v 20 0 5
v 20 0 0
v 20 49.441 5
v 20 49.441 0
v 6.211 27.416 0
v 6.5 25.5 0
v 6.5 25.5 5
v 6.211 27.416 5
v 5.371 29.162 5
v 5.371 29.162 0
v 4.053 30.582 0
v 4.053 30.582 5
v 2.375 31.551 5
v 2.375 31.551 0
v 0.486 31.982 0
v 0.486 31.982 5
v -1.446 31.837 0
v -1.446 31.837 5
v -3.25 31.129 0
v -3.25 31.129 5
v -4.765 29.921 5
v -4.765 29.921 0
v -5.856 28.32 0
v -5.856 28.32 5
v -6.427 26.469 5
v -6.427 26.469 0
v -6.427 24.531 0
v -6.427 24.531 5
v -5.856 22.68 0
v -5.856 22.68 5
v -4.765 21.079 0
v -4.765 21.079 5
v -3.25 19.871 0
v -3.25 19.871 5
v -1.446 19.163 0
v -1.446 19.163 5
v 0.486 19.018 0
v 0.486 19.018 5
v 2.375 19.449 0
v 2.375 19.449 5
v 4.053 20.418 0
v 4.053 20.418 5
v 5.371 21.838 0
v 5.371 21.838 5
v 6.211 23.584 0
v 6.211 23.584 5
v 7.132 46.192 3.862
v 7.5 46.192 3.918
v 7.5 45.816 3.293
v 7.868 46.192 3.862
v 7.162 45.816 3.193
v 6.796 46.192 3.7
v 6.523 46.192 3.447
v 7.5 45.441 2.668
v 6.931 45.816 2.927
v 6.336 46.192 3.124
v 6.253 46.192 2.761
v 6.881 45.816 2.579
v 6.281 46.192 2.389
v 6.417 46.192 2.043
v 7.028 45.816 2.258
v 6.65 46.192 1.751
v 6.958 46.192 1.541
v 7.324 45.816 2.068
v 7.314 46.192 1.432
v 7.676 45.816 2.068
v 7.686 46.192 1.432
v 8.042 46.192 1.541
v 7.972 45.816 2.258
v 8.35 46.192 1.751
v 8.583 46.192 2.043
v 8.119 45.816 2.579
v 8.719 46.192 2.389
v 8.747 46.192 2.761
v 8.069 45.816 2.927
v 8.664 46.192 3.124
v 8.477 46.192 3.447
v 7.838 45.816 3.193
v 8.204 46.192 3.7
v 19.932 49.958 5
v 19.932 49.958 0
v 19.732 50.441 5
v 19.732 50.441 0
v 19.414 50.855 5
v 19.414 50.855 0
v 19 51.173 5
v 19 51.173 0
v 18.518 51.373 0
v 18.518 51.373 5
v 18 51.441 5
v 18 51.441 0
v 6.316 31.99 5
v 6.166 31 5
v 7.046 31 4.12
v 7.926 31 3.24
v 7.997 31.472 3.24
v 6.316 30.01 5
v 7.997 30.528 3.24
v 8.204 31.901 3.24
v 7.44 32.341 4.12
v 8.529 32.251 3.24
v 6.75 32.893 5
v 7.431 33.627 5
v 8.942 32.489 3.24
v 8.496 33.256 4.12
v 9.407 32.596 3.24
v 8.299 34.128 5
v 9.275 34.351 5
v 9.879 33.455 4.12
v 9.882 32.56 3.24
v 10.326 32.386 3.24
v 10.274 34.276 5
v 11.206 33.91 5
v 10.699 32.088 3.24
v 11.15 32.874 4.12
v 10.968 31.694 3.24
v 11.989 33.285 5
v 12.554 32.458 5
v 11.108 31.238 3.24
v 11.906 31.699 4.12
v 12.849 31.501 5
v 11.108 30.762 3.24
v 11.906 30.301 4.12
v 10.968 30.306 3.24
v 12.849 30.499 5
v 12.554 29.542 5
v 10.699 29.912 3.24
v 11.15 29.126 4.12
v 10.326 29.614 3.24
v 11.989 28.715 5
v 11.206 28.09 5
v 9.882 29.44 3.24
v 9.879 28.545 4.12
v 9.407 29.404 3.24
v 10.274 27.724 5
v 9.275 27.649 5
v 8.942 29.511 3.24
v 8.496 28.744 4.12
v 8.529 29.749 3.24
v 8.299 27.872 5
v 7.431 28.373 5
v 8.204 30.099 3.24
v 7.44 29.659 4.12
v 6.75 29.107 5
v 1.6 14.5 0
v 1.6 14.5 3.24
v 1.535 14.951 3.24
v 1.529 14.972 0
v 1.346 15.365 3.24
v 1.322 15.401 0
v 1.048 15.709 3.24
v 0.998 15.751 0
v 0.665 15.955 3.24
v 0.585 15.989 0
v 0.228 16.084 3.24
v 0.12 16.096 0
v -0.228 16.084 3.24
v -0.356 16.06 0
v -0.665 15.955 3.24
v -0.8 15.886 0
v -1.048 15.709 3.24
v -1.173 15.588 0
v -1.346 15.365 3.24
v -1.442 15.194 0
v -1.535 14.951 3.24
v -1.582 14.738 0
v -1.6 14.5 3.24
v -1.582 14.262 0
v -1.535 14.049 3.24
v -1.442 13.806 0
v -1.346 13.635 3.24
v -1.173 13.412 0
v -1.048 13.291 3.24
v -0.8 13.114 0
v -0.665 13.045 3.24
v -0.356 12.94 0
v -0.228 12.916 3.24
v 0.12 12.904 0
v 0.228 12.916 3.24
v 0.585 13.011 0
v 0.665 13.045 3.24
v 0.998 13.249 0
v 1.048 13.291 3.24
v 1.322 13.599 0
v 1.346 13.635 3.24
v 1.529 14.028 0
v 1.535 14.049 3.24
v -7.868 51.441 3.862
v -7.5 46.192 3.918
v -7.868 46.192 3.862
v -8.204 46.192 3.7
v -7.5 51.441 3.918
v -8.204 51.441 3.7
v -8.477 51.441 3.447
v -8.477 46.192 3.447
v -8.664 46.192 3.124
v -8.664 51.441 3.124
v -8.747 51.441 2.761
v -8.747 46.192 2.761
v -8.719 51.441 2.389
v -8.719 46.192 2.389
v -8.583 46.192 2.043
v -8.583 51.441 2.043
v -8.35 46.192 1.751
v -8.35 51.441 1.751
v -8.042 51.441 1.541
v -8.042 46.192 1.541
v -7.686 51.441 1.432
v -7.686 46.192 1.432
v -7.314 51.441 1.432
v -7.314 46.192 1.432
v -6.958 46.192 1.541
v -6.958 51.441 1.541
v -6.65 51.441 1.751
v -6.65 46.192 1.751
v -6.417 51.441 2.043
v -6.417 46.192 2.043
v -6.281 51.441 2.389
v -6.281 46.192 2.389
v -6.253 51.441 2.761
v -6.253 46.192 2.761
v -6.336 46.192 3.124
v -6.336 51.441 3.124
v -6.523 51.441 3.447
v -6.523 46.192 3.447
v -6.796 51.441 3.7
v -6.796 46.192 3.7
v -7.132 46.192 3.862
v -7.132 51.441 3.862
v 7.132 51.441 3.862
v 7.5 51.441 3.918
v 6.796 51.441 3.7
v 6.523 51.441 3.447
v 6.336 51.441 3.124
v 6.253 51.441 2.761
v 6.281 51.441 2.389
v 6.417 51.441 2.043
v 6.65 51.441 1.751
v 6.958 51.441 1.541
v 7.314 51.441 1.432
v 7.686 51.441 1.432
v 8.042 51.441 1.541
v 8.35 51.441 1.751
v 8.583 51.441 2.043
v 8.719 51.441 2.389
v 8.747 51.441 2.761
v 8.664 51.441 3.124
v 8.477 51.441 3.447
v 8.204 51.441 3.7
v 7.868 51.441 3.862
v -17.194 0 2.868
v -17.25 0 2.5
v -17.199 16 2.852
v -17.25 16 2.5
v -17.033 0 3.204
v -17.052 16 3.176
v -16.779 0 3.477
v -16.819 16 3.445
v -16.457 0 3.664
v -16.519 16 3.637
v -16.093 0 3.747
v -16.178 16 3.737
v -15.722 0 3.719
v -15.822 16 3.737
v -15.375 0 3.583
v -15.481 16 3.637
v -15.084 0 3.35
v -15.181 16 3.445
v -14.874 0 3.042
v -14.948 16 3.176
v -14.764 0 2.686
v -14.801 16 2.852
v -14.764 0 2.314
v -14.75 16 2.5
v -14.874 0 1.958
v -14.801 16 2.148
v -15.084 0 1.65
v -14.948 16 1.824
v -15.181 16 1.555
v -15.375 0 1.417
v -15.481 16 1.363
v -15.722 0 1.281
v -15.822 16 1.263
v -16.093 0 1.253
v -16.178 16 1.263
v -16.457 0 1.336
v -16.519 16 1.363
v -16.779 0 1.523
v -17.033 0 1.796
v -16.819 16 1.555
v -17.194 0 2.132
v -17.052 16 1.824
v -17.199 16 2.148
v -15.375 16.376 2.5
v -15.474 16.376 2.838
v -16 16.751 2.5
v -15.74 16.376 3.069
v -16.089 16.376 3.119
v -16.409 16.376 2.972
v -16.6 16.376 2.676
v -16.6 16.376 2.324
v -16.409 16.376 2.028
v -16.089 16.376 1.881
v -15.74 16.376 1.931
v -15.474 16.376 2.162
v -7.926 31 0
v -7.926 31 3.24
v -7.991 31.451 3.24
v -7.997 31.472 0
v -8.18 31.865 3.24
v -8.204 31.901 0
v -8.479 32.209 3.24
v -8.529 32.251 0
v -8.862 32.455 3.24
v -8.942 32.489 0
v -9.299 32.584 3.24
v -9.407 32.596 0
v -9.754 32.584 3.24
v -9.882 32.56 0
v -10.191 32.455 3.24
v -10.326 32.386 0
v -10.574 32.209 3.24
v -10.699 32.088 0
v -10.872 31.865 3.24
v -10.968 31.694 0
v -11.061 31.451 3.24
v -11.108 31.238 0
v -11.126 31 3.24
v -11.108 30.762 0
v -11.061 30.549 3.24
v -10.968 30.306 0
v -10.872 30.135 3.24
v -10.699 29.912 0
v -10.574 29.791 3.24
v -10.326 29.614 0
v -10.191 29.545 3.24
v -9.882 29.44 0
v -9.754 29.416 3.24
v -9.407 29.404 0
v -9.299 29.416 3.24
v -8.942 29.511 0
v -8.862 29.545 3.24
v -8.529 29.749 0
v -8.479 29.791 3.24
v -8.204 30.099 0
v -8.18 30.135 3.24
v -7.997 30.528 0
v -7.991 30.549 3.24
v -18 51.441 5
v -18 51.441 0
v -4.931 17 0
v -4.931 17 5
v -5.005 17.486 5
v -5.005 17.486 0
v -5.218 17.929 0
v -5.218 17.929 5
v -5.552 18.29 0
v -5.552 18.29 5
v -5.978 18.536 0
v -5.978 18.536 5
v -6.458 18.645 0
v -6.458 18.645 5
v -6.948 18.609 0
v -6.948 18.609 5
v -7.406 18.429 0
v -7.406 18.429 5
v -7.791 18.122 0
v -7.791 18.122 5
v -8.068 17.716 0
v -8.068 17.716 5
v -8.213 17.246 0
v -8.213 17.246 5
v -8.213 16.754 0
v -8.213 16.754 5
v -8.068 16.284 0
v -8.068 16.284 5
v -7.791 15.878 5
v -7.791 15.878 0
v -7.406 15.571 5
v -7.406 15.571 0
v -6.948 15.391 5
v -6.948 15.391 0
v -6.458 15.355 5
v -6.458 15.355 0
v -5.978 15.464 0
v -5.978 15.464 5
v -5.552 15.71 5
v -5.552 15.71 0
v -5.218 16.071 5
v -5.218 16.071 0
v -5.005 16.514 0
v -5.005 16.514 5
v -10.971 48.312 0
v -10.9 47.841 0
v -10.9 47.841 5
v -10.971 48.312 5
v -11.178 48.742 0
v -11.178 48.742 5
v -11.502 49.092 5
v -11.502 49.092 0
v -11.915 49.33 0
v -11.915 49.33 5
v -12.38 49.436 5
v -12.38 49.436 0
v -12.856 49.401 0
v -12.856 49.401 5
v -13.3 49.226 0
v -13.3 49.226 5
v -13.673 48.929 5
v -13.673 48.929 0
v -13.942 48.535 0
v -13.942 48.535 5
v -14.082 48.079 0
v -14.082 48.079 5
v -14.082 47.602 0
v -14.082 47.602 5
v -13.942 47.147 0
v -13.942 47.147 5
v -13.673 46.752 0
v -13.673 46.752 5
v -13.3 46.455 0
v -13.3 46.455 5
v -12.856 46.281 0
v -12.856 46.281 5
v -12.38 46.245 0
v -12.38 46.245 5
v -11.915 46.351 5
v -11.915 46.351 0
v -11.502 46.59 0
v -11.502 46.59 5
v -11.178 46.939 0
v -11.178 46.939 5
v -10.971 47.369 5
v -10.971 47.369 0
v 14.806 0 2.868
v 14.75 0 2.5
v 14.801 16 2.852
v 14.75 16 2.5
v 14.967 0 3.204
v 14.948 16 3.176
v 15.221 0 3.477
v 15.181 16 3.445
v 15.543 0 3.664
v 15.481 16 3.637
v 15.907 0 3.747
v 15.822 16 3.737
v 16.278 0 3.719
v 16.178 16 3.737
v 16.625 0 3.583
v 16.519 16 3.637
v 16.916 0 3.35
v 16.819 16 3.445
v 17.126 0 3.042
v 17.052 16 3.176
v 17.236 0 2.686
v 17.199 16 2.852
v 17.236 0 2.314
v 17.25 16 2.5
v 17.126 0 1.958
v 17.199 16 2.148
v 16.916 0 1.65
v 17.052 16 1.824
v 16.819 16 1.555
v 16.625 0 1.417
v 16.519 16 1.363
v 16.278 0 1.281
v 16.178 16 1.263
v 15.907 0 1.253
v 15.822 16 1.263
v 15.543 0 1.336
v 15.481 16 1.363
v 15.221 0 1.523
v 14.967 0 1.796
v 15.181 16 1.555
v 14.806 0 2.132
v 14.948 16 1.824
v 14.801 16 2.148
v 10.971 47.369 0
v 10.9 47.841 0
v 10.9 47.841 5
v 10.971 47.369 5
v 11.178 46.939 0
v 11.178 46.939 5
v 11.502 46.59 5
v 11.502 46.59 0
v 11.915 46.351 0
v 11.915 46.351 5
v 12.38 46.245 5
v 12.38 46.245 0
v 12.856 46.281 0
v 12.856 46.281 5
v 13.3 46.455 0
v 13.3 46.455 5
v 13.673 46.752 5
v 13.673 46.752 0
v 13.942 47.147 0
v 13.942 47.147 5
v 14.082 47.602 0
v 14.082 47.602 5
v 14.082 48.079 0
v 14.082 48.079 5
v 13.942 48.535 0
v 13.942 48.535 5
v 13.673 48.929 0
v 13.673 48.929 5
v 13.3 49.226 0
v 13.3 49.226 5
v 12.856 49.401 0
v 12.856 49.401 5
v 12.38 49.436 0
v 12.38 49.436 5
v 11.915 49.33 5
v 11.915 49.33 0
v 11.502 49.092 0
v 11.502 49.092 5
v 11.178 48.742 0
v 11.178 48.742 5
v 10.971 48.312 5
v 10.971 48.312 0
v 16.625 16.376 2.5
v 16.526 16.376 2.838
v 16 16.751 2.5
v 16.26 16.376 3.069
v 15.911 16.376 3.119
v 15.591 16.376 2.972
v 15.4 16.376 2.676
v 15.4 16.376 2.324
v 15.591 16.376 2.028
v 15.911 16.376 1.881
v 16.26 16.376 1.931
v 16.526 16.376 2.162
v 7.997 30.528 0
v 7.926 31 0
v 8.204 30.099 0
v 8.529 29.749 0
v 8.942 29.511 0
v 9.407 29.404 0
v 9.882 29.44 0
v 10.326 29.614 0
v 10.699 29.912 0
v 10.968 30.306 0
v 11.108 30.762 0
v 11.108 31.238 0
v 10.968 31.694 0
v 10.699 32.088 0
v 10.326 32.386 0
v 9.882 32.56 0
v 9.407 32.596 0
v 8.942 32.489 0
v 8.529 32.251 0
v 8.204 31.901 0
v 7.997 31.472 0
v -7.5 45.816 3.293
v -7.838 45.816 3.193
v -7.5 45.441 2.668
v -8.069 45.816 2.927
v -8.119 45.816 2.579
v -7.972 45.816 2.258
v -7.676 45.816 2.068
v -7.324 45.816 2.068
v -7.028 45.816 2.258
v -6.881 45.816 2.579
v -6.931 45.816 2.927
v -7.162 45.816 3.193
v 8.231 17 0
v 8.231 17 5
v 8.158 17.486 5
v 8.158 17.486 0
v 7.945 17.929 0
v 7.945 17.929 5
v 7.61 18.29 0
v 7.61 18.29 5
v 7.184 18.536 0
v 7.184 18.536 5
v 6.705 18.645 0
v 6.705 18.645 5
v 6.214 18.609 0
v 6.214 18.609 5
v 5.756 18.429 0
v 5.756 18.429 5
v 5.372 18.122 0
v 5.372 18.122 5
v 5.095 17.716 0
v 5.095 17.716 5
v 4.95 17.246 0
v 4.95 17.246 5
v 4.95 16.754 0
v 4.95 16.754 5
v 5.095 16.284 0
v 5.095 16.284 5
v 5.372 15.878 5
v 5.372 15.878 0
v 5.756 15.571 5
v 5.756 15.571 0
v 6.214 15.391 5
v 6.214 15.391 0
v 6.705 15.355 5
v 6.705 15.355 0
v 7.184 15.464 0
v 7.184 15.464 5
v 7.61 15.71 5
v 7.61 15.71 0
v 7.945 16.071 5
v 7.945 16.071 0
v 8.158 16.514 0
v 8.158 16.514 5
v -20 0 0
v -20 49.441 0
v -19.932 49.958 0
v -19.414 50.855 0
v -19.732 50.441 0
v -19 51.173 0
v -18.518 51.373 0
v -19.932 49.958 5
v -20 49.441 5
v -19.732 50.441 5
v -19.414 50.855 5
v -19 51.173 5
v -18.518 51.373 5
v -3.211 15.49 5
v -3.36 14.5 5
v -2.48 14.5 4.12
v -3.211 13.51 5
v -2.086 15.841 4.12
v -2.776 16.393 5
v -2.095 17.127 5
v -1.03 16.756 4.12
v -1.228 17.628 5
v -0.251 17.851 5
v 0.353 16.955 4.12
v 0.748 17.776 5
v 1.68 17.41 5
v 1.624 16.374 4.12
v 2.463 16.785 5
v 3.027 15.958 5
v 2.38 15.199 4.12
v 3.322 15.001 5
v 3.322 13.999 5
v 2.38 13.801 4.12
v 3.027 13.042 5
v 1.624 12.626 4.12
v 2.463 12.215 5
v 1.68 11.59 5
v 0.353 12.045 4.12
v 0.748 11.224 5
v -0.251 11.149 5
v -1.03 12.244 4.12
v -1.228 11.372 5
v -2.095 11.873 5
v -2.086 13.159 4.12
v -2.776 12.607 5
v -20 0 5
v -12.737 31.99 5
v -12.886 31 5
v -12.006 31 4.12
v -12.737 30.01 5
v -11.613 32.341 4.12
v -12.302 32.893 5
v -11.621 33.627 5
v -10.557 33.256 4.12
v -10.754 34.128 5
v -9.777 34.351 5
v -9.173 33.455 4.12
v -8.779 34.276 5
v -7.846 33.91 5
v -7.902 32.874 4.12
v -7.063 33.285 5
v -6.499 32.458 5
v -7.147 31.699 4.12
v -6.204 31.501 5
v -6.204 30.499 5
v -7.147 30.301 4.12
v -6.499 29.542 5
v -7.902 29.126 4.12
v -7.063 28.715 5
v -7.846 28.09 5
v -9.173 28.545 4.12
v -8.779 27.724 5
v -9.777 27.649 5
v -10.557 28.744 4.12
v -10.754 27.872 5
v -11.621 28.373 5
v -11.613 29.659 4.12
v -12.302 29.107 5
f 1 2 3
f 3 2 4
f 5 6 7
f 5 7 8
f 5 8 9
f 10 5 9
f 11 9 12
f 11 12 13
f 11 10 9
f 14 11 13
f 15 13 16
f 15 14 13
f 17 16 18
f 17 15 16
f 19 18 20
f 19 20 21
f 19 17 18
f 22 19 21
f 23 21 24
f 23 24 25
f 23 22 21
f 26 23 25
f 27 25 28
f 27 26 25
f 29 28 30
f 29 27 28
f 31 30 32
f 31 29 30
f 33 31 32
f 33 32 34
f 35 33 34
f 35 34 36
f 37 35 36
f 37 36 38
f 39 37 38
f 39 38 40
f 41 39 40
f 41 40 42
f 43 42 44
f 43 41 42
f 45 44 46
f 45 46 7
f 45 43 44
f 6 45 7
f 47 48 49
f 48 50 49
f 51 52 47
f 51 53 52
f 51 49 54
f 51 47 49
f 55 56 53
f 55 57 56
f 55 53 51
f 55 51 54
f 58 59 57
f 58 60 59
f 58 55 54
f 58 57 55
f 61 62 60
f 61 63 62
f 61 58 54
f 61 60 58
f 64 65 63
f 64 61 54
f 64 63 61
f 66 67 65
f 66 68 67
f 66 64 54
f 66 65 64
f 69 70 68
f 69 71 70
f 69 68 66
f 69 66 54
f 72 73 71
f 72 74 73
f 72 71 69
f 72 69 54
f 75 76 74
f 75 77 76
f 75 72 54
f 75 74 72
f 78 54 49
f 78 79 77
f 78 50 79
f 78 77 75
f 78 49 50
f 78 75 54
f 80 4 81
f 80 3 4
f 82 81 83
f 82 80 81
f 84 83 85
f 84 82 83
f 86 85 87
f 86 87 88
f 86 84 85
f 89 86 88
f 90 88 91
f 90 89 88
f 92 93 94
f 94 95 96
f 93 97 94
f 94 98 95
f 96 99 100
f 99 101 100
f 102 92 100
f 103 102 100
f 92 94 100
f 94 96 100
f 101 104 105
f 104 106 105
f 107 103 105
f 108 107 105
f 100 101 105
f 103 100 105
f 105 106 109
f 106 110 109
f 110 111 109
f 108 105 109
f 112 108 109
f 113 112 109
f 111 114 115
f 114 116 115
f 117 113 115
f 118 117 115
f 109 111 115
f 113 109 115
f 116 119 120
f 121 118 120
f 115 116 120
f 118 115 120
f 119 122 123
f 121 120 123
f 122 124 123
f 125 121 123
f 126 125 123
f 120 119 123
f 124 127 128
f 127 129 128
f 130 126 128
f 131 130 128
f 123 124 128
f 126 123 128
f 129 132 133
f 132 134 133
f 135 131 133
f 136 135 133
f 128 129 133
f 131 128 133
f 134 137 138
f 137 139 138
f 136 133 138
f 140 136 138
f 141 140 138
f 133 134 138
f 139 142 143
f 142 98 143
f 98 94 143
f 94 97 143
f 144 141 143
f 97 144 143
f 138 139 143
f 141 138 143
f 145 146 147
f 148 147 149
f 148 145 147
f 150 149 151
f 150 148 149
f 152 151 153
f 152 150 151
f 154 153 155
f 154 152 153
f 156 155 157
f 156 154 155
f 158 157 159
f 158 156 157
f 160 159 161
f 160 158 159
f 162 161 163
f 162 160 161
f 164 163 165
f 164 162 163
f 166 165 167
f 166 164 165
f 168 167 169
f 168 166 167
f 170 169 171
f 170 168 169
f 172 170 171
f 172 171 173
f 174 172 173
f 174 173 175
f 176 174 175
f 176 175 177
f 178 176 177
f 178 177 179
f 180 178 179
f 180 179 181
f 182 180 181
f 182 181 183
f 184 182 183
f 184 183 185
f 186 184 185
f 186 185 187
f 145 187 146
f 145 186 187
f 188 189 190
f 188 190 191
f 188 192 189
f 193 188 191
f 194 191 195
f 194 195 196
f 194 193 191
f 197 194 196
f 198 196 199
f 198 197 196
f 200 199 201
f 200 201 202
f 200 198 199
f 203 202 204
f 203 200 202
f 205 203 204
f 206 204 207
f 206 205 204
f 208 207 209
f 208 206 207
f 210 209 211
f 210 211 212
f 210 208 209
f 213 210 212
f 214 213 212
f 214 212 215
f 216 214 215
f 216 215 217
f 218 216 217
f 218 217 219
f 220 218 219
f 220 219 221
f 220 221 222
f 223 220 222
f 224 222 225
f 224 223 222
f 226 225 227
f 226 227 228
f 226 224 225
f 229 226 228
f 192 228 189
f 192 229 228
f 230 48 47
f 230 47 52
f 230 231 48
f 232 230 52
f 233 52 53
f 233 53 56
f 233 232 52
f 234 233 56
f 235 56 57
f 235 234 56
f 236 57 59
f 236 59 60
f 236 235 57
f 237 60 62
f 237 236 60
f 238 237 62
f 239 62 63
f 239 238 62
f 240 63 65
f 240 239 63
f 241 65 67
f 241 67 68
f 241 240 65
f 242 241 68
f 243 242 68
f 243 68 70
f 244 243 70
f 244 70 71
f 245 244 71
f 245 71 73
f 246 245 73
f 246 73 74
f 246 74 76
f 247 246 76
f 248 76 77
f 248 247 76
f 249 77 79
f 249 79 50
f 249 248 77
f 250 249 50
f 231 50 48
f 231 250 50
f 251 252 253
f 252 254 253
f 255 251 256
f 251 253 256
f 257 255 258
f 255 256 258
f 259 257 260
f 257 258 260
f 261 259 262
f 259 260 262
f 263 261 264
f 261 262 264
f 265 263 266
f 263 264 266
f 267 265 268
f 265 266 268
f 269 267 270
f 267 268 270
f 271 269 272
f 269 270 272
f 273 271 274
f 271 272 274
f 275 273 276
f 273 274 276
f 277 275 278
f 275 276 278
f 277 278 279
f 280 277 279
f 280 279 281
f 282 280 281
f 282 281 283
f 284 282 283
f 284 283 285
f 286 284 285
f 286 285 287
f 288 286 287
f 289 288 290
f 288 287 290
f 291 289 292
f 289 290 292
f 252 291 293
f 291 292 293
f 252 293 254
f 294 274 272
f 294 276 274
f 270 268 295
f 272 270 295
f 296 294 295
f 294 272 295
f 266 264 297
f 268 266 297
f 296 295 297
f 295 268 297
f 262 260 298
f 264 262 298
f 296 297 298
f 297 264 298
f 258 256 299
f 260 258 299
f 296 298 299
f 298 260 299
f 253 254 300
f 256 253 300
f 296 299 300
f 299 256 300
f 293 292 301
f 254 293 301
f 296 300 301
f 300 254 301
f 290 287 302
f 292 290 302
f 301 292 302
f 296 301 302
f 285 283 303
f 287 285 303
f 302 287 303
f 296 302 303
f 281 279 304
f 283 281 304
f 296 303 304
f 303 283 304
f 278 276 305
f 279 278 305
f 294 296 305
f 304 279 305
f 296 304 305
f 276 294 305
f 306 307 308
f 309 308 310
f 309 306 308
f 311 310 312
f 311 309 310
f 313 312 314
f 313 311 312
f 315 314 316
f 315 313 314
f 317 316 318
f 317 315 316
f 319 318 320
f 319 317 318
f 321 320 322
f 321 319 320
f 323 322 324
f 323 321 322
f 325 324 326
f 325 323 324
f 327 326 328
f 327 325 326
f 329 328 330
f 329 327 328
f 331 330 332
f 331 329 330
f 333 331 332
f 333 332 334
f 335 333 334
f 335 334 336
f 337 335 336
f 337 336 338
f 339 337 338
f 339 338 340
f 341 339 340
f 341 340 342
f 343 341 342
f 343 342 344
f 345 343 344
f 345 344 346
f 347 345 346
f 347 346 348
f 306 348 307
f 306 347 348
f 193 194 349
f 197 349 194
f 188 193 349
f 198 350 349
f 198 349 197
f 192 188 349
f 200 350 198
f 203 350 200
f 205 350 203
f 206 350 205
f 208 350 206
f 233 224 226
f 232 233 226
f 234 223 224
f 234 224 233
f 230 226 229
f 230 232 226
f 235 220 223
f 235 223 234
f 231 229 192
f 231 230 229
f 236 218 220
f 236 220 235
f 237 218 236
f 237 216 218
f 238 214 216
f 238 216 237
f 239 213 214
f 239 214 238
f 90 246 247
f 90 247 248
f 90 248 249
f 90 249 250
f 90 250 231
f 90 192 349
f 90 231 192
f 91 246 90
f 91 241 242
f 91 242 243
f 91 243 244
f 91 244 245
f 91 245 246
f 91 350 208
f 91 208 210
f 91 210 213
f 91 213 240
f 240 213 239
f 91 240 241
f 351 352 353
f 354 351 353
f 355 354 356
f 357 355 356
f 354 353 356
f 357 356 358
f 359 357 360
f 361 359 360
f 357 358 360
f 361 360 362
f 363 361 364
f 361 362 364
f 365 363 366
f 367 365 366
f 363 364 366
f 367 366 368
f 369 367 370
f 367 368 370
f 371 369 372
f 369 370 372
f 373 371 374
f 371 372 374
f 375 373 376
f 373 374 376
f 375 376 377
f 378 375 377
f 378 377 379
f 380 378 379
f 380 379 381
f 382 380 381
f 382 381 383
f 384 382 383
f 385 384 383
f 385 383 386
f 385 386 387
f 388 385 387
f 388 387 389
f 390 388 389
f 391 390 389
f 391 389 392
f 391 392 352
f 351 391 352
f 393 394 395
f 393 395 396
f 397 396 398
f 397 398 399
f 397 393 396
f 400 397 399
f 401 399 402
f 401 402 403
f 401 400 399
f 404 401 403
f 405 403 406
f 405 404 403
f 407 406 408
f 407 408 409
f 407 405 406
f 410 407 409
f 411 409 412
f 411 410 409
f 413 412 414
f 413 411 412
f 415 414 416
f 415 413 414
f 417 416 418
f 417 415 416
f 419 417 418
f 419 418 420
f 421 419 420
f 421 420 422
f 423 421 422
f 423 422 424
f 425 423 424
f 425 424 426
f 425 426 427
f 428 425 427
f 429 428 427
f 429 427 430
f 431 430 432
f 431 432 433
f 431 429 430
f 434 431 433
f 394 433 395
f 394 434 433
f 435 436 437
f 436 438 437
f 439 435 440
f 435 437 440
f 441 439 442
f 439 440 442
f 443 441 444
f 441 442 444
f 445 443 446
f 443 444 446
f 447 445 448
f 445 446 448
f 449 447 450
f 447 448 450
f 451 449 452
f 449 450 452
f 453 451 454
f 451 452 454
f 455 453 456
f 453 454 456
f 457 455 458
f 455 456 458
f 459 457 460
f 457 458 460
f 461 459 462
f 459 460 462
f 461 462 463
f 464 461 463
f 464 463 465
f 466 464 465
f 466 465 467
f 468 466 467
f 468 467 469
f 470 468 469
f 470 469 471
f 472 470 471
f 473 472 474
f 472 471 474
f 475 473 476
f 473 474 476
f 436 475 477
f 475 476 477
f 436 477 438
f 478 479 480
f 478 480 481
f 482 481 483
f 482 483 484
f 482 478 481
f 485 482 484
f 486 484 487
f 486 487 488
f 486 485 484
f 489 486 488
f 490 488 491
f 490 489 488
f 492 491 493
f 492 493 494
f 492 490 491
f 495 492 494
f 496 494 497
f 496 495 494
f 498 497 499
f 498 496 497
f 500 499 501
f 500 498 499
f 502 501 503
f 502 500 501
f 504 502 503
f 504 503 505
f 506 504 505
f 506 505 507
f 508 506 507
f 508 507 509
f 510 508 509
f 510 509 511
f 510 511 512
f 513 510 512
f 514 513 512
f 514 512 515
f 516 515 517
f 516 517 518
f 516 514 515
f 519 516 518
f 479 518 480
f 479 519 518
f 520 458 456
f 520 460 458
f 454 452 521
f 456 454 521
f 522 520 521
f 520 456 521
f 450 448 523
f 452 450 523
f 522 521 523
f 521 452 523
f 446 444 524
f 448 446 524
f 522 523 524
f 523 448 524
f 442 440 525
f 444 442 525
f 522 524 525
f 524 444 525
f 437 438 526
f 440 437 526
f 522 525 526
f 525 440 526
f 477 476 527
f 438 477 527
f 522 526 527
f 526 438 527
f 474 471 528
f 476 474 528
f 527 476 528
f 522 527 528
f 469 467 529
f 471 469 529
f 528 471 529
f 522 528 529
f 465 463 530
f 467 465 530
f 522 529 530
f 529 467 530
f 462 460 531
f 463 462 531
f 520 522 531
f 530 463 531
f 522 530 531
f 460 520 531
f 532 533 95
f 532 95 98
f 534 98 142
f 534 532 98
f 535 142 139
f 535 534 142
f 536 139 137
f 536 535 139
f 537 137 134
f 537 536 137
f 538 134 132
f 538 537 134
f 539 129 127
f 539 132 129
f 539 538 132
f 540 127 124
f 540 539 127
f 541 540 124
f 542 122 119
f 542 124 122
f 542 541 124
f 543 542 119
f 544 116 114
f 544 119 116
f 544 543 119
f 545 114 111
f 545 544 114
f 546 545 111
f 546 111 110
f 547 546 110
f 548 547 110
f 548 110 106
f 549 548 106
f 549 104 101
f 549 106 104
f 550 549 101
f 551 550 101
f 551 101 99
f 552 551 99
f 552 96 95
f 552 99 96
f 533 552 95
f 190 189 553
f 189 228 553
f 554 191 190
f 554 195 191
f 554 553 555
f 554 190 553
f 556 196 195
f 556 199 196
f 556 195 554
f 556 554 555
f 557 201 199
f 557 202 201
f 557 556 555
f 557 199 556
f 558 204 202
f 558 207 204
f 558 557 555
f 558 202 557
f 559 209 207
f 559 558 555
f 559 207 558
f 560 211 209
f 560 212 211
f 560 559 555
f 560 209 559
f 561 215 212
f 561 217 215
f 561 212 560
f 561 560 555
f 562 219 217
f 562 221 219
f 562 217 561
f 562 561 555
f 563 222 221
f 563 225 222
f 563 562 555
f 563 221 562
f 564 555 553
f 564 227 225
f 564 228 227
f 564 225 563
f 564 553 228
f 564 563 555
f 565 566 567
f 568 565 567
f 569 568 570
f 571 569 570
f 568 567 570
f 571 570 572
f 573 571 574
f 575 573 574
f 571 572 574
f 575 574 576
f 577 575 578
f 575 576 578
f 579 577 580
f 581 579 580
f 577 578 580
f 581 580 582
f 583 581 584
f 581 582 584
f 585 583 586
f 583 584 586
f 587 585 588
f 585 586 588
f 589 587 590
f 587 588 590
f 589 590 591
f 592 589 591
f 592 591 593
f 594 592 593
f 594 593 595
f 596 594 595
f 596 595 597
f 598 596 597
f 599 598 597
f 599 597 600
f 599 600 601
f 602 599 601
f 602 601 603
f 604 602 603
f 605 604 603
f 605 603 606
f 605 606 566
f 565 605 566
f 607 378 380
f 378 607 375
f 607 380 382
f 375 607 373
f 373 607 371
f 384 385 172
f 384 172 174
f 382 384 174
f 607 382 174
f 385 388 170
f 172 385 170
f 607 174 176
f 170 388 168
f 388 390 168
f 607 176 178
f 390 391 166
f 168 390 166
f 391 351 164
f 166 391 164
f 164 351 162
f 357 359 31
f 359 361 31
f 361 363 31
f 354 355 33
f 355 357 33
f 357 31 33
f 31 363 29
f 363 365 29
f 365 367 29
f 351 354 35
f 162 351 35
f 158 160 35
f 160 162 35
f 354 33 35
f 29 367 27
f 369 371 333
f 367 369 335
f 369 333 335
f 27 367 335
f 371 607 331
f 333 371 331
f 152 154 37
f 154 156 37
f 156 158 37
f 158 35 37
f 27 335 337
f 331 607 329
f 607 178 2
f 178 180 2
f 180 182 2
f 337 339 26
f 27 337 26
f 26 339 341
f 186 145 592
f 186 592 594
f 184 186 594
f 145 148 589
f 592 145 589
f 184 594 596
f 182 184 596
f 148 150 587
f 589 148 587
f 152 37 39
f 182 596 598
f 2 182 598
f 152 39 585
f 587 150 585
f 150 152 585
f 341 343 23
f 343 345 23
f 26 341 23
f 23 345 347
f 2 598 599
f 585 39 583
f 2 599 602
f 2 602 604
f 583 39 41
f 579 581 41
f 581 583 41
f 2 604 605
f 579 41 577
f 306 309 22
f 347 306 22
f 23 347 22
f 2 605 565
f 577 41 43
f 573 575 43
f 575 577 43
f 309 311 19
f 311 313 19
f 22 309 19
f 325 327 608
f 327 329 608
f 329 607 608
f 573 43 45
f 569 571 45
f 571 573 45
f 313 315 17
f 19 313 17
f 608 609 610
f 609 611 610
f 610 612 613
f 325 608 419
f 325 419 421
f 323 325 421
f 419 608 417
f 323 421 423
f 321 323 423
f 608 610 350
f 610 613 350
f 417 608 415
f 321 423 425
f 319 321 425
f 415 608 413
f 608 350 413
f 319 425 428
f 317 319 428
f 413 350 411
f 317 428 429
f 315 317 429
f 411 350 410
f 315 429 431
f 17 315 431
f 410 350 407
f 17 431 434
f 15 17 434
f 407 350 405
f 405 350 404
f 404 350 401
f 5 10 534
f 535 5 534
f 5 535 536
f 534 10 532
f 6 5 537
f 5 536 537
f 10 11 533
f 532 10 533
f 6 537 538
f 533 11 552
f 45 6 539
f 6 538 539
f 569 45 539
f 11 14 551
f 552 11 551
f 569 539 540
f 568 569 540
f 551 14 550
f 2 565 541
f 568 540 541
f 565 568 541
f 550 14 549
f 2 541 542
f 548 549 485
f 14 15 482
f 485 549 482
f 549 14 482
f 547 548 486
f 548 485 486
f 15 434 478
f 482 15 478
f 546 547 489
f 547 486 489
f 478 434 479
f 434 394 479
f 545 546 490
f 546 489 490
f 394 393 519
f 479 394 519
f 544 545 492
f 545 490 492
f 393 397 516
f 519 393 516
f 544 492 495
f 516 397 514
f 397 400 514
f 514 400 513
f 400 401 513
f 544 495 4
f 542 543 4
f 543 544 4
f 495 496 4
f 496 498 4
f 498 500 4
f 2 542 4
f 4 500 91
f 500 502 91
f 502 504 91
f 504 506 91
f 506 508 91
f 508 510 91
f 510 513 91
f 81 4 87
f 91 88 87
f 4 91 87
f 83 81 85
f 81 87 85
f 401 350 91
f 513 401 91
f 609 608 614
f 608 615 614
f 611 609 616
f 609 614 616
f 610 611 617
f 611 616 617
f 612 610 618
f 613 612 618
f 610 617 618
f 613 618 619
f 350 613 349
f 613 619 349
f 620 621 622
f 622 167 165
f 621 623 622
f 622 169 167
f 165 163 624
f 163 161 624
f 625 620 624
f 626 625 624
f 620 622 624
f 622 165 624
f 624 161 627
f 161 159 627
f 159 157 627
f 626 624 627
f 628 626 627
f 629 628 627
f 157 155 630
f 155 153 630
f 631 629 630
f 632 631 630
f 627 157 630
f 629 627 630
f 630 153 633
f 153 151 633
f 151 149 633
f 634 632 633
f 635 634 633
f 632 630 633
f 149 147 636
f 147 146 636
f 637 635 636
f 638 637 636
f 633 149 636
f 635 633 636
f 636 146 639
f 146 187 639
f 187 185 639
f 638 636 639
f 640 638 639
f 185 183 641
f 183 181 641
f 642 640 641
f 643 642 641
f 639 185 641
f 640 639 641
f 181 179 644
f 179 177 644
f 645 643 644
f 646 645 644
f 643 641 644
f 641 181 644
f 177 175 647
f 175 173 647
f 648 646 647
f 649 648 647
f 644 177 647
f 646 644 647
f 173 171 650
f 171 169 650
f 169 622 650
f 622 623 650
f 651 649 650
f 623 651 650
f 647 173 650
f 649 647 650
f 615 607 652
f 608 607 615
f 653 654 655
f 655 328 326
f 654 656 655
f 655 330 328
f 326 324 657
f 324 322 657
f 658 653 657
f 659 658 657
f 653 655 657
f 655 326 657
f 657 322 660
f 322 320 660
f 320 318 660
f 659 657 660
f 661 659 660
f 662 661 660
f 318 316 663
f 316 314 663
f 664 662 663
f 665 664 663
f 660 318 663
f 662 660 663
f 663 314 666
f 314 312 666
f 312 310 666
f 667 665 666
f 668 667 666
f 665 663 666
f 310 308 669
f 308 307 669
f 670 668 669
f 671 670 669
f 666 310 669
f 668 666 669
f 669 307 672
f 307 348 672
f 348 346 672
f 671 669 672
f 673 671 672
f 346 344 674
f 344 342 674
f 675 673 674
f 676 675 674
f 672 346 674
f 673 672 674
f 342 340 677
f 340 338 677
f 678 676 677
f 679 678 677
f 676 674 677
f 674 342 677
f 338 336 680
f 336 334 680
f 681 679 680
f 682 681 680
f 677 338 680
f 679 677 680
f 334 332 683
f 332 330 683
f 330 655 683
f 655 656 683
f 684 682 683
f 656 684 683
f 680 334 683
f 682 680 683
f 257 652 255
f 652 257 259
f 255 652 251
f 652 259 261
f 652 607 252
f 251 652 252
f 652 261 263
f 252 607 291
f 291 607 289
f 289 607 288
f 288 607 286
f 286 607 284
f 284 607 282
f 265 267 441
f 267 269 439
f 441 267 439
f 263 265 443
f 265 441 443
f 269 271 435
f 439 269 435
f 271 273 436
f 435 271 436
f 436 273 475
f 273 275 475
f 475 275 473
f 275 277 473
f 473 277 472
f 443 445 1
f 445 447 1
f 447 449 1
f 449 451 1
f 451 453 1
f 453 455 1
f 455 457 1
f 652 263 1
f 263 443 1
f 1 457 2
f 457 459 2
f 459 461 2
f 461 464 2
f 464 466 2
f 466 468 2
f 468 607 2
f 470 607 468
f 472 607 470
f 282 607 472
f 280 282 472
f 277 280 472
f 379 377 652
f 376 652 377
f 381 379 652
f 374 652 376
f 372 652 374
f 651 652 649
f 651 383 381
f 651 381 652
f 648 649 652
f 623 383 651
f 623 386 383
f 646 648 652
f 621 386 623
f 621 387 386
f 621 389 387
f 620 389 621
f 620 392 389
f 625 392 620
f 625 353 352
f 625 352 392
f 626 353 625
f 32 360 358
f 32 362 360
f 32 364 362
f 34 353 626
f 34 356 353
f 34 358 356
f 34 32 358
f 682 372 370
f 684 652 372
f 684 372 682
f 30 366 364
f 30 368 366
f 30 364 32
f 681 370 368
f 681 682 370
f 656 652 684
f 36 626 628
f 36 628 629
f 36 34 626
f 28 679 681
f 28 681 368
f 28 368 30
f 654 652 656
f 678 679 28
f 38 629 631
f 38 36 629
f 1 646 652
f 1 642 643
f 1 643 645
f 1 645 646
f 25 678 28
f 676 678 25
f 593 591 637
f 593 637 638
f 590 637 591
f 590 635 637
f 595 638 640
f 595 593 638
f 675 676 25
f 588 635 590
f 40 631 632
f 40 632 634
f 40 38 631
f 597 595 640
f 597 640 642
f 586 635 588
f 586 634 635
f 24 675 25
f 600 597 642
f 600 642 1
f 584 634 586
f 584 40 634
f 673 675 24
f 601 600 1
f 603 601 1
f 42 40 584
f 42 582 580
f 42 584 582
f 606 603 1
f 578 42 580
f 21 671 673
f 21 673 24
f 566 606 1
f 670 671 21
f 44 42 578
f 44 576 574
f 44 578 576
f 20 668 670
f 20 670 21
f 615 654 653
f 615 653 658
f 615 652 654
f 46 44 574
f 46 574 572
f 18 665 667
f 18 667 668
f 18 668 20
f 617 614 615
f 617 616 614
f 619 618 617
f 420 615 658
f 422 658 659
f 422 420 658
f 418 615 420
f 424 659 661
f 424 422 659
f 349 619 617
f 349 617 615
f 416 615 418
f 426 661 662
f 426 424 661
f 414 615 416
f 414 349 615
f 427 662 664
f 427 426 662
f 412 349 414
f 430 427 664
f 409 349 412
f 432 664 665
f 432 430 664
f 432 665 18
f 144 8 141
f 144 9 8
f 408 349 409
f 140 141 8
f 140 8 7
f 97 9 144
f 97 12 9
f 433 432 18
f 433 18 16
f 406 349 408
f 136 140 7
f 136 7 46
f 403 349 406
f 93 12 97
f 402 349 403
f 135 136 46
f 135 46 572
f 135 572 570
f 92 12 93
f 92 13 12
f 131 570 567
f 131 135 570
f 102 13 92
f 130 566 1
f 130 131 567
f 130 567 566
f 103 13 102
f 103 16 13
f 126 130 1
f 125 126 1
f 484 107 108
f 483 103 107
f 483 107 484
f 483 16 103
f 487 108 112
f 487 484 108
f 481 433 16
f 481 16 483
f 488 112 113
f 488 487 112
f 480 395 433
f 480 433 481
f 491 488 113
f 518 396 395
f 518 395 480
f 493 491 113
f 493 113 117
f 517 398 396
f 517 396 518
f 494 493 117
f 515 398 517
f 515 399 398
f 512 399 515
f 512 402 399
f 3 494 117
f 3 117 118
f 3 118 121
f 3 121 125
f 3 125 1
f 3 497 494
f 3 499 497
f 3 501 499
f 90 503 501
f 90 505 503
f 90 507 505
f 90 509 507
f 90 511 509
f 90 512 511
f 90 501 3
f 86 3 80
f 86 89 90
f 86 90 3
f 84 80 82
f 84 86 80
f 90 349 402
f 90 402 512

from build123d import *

# Parameters (mm, degrees)
SKETCH1_W                     = 40
SKETCH1_H                     = 51.440769906
SKETCH1_R                     = 6.5
SKETCH1_R_2                   = 1.6
BOSS_EXTRUDE1_DEPTH           = 5
M4X0_7_TAPPED_HOLE1_D         = 3.3
CSK_FOR_M3_SFHCS1_D           = 3.2
CSK_FOR_M3_SFHCS1_CSINK_D     = 6.72
CSK_FOR_M3_SFHCS1_CSINK_ANGLE = 90
FILLET1_R                     = 2
M3X0_5_TAPPED_HOLE1_D         = 2.5
M3X0_5_TAPPED_HOLE1_DEPTH     = 16
M3X0_5_TAPPED_HOLE1_TIP       = 0.751075774
LPATTERN1_COUNT               = 2
LPATTERN1_PITCH               = 15


with BuildPart() as part:
    # Sketch1 → Boss-Extrude1 (new body)
    with BuildSketch(Plane.XY):
        with Locations((0, 25.720384953)):
            Rectangle(SKETCH1_W, SKETCH1_H)
        with Locations((0, 25.5)):
            Circle(SKETCH1_R, mode=Mode.SUBTRACT)
        with Locations((0, 14.5)):
            Circle(SKETCH1_R_2, mode=Mode.SUBTRACT)
        with Locations((-9.526279442, 31)):
            Circle(SKETCH1_R_2, mode=Mode.SUBTRACT)
        with Locations((9.526279442, 31)):
            Circle(SKETCH1_R_2, mode=Mode.SUBTRACT)
        with Locations((-12.5, 47.840769906)):
            Circle(SKETCH1_R_2, mode=Mode.SUBTRACT)
        with Locations((12.5, 47.840769906)):
            Circle(SKETCH1_R_2, mode=Mode.SUBTRACT)
    extrude(amount=BOSS_EXTRUDE1_DEPTH)

    # M4x0.7 Tapped Hole1 (through all)
    with Locations(Plane(origin=(0, 0, 0), x_dir=(-1, 0, 0), z_dir=(0, 0, -1))):
        with Locations((-6.581223291, 17), (6.581223291, 17)):
            Hole(M4X0_7_TAPPED_HOLE1_D / 2)

    # CSK for M3 SFHCS1 (through all)
    with Locations(Plane.XY.offset(5)):
        with Locations((-9.526279442, 31), (9.526279442, 31), (0, 14.5)):
            CounterSinkHole(CSK_FOR_M3_SFHCS1_D / 2, CSK_FOR_M3_SFHCS1_CSINK_D / 2, counter_sink_angle=CSK_FOR_M3_SFHCS1_CSINK_ANGLE)

    # Fillet1
    fillet1_edges = [part.edges().sort_by_distance(p)[0] for p in [
        (-20, 51.440769906, 2.5),
        (20, 51.440769906, 2.5),
    ]]
    fillet(fillet1_edges, radius=FILLET1_R)

    # M3x0.5 Tapped Hole1
    with Locations(Plane.XZ):
        with Locations((-16, 2.5), (16, 2.5)):
            Hole(M3X0_5_TAPPED_HOLE1_D / 2, depth=M3X0_5_TAPPED_HOLE1_DEPTH)
            with Locations((0, 0, -(M3X0_5_TAPPED_HOLE1_DEPTH + M3X0_5_TAPPED_HOLE1_TIP / 2))):  # 118° drill point
                Cone(0, M3X0_5_TAPPED_HOLE1_D / 2, M3X0_5_TAPPED_HOLE1_TIP, mode=Mode.SUBTRACT)

    # Sketch34 → M3 Tapped Hole1 (revolve, cut)
    with BuildSketch(Plane(origin=(7.5, 51.440769906, 2.667636596), x_dir=(0, 0, 1), z_dir=(1, 0, 0))):
        Polygon((0, 0), (0, 6), (1.25, 5.248924226), (1.25, 0), align=None)
    m3_tapped_hole1 = revolve(axis=Axis((7.5, 57.790769906, 2.667636596), (0, -1, 0)), mode=Mode.SUBTRACT)

    # LPattern1: M3 Tapped Hole1 ×2
    with Locations(*[(-i * LPATTERN1_PITCH, 0, 0) for i in range(1, LPATTERN1_COUNT)]):
        add(m3_tapped_hole1, mode=Mode.SUBTRACT)


solid = part.part
